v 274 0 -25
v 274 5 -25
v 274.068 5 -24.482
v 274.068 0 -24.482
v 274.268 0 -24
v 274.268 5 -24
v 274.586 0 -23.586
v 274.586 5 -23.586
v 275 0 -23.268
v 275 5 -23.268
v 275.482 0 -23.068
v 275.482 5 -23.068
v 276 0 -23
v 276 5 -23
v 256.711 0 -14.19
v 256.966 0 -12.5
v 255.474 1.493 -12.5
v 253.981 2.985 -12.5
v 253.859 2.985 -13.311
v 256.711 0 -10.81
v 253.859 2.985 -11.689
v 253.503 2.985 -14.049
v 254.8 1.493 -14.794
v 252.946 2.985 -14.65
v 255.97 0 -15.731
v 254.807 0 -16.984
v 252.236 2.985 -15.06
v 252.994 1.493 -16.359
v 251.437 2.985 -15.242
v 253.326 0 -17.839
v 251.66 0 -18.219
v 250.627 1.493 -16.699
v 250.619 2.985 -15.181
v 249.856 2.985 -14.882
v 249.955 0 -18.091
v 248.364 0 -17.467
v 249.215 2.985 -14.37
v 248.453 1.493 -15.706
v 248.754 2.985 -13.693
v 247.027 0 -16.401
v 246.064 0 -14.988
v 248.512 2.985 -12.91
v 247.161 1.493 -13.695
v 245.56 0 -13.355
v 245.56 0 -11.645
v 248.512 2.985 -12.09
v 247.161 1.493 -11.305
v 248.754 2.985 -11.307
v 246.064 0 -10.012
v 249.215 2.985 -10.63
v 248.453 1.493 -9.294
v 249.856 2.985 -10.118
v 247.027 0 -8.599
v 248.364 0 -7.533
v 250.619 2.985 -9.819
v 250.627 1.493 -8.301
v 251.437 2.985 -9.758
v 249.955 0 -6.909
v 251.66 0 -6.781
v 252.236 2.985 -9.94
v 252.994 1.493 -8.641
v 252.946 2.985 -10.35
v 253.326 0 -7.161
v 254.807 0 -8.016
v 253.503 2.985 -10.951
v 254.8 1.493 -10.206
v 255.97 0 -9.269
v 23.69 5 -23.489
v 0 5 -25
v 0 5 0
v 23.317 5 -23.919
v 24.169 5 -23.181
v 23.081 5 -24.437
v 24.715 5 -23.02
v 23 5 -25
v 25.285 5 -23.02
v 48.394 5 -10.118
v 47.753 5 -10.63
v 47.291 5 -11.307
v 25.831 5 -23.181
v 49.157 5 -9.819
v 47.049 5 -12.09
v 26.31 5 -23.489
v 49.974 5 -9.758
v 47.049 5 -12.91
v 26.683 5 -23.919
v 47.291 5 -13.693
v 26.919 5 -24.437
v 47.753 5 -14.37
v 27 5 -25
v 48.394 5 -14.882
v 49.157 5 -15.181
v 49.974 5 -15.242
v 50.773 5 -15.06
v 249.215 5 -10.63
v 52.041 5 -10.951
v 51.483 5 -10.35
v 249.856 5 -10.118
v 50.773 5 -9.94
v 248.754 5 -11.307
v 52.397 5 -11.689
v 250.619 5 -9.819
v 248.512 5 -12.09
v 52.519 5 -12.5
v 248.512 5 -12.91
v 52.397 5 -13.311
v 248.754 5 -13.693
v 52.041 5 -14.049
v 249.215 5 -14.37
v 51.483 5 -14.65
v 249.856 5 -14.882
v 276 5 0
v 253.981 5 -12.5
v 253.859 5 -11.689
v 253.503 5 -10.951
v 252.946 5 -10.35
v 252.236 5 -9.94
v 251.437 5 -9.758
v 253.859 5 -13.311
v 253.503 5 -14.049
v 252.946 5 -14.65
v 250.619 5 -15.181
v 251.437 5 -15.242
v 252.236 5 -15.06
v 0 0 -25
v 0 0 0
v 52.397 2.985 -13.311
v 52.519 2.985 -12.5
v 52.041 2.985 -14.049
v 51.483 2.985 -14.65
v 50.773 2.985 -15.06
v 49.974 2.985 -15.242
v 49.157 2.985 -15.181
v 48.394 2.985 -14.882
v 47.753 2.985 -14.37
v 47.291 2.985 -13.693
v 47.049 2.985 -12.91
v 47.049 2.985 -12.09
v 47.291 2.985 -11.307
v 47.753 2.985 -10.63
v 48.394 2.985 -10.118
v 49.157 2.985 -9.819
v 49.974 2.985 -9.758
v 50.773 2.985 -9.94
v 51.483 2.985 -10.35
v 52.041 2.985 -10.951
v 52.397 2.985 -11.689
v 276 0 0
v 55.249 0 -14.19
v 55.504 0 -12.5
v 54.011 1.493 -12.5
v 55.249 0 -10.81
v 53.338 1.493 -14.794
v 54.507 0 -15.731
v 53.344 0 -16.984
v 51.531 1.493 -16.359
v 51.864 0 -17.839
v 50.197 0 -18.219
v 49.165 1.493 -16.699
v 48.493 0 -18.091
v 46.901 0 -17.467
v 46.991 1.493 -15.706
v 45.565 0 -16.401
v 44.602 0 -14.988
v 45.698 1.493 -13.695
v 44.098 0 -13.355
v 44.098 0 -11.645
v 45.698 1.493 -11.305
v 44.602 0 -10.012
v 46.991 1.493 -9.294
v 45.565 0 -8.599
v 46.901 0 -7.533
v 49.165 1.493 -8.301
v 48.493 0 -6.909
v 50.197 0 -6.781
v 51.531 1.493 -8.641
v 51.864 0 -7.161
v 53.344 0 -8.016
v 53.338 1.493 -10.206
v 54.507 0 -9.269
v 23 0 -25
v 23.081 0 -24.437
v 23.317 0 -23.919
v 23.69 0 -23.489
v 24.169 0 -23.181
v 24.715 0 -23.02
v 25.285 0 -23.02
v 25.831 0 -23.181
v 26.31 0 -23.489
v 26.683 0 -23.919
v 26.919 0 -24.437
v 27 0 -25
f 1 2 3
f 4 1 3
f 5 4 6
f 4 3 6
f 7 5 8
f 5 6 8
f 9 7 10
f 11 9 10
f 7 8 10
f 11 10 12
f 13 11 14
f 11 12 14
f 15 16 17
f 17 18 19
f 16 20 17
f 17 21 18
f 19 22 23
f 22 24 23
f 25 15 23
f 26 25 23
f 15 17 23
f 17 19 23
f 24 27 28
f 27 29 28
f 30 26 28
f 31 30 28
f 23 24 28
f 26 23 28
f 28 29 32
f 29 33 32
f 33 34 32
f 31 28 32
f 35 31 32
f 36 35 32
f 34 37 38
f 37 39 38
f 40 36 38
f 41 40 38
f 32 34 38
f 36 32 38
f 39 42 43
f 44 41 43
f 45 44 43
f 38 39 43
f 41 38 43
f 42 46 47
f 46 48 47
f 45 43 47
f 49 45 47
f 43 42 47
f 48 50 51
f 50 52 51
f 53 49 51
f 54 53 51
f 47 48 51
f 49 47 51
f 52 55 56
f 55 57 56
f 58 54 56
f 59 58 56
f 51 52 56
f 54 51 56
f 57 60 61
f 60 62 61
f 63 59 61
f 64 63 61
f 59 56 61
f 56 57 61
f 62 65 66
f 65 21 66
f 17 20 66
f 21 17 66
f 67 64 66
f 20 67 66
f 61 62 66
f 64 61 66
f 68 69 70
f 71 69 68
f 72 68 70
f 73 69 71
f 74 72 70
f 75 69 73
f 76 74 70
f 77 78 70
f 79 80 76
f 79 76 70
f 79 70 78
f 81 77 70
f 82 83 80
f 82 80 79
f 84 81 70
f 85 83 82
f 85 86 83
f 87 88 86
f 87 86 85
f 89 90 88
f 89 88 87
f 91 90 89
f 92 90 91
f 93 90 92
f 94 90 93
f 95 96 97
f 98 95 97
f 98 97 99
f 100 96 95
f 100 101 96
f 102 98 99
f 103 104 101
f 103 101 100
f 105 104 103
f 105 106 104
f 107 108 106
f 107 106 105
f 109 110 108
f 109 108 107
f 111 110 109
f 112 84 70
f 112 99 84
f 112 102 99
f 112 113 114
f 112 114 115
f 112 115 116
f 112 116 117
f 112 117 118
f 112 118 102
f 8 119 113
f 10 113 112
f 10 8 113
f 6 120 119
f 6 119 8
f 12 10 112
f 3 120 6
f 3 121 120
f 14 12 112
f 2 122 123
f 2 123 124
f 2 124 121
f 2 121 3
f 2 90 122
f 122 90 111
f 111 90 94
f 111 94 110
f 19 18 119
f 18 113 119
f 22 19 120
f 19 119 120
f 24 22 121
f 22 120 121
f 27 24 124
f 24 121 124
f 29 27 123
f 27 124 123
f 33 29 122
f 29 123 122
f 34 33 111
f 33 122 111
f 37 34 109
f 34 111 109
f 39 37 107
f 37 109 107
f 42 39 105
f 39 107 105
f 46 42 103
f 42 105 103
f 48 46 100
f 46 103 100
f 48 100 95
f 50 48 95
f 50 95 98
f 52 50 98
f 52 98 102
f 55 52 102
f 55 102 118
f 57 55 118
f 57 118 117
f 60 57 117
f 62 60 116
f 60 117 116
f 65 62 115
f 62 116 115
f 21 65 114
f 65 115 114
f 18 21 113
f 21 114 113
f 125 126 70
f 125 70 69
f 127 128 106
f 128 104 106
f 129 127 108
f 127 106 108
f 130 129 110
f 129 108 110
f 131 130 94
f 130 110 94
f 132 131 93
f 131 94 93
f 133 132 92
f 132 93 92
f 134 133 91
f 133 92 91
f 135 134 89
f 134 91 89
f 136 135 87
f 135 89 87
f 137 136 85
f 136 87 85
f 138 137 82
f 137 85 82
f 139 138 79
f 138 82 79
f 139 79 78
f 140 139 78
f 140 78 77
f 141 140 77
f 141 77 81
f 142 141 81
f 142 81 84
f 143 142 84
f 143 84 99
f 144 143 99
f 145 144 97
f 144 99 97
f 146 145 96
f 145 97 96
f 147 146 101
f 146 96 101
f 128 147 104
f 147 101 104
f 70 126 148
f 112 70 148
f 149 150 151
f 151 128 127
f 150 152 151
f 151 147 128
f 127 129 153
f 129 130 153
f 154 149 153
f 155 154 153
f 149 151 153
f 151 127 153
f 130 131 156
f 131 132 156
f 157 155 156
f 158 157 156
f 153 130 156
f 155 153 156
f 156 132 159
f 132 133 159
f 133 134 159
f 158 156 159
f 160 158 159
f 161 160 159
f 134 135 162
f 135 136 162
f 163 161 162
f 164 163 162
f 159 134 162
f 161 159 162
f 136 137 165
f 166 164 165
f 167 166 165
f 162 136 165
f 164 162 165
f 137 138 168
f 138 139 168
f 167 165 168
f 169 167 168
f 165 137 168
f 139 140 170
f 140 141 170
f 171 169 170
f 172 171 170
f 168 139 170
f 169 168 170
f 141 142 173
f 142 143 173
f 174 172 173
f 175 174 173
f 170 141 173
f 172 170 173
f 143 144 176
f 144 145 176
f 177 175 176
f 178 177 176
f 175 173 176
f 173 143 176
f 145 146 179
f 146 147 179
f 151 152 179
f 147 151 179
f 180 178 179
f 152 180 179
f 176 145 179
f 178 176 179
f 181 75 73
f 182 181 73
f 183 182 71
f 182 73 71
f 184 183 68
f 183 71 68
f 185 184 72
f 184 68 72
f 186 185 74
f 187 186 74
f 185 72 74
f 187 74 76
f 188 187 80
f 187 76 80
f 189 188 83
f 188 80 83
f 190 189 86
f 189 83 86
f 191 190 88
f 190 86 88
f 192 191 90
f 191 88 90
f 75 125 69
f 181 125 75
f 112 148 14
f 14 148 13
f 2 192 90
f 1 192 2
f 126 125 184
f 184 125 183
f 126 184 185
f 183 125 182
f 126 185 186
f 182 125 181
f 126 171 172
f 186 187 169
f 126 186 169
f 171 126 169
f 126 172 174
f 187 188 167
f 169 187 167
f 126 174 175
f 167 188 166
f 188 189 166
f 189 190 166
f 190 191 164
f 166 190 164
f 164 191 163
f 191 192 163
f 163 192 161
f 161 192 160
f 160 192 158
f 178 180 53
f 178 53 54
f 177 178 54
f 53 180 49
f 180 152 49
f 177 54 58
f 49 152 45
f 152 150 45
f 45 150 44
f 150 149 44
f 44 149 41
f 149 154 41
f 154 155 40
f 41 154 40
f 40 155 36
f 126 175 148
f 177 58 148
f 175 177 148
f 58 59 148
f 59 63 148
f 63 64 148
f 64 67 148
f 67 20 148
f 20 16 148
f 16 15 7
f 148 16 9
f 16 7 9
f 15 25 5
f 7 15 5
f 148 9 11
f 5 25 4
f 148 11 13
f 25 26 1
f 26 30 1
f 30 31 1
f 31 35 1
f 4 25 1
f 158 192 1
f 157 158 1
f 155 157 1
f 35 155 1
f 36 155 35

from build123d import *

# Parameters (mm, degrees)
CROQUIS1_W                                           = 276
CROQUIS1_H                                           = 25
SALIENTE_EXTRUIR1_DEPTH                              = 5
CROQUIS2_R                                           = 2
CORTAR_EXTRUIR1_DEPTH                                = 5
AVELLANADO_PARA_TORNILLO_CON_CABEZA_AVEL_D           = 5.5
AVELLANADO_PARA_TORNILLO_CON_CABEZA_AVEL_DEPTH       = 5
AVELLANADO_PARA_TORNILLO_CON_CABEZA_AVEL_CSINK_D     = 11.47
AVELLANADO_PARA_TORNILLO_CON_CABEZA_AVEL_CSINK_ANGLE = 90
AVELLANADO_PARA_TORNILLO_CON_CABEZA_AVEL_TIP         = 1.652366702


with BuildPart() as part:
    # Croquis1 → Saliente-Extruir1 (new body)
    with BuildSketch(Plane(origin=(0, 0, 0), x_dir=(1, 0, 0), z_dir=(0, 1, 0))):
        with Locations((138, 12.5)):
            Rectangle(CROQUIS1_W, CROQUIS1_H)
    extrude(amount=SALIENTE_EXTRUIR1_DEPTH)

    # Croquis2 → Cortar-Extruir1 (cut)
    with BuildSketch(Plane(origin=(0, 5, 0), x_dir=(1, 0, 0), z_dir=(0, 1, 0))):
        with Locations((276, 25)):
            Circle(CROQUIS2_R)
        with Locations((25, 25)):
            Circle(CROQUIS2_R)
    extrude(amount=-CORTAR_EXTRUIR1_DEPTH, mode=Mode.SUBTRACT)

    # Avellanado para tornillo con cabeza avellanada de clavija hexagonal de M51
    with Locations(Plane(origin=(0, 0, 0), x_dir=(-1, 0, 0), z_dir=(0, -1, 0))):
        with Locations((-251.231218281, 12.5), (-49.768781719, 12.5)):
            CounterSinkHole(AVELLANADO_PARA_TORNILLO_CON_CABEZA_AVEL_D / 2, AVELLANADO_PARA_TORNILLO_CON_CABEZA_AVEL_CSINK_D / 2, depth=AVELLANADO_PARA_TORNILLO_CON_CABEZA_AVEL_DEPTH, counter_sink_angle=AVELLANADO_PARA_TORNILLO_CON_CABEZA_AVEL_CSINK_ANGLE)
            with Locations((0, 0, -(AVELLANADO_PARA_TORNILLO_CON_CABEZA_AVEL_DEPTH + AVELLANADO_PARA_TORNILLO_CON_CABEZA_AVEL_TIP / 2))):  # 118° drill point
                Cone(0, AVELLANADO_PARA_TORNILLO_CON_CABEZA_AVEL_D / 2, AVELLANADO_PARA_TORNILLO_CON_CABEZA_AVEL_TIP, mode=Mode.SUBTRACT)


solid = part.part
